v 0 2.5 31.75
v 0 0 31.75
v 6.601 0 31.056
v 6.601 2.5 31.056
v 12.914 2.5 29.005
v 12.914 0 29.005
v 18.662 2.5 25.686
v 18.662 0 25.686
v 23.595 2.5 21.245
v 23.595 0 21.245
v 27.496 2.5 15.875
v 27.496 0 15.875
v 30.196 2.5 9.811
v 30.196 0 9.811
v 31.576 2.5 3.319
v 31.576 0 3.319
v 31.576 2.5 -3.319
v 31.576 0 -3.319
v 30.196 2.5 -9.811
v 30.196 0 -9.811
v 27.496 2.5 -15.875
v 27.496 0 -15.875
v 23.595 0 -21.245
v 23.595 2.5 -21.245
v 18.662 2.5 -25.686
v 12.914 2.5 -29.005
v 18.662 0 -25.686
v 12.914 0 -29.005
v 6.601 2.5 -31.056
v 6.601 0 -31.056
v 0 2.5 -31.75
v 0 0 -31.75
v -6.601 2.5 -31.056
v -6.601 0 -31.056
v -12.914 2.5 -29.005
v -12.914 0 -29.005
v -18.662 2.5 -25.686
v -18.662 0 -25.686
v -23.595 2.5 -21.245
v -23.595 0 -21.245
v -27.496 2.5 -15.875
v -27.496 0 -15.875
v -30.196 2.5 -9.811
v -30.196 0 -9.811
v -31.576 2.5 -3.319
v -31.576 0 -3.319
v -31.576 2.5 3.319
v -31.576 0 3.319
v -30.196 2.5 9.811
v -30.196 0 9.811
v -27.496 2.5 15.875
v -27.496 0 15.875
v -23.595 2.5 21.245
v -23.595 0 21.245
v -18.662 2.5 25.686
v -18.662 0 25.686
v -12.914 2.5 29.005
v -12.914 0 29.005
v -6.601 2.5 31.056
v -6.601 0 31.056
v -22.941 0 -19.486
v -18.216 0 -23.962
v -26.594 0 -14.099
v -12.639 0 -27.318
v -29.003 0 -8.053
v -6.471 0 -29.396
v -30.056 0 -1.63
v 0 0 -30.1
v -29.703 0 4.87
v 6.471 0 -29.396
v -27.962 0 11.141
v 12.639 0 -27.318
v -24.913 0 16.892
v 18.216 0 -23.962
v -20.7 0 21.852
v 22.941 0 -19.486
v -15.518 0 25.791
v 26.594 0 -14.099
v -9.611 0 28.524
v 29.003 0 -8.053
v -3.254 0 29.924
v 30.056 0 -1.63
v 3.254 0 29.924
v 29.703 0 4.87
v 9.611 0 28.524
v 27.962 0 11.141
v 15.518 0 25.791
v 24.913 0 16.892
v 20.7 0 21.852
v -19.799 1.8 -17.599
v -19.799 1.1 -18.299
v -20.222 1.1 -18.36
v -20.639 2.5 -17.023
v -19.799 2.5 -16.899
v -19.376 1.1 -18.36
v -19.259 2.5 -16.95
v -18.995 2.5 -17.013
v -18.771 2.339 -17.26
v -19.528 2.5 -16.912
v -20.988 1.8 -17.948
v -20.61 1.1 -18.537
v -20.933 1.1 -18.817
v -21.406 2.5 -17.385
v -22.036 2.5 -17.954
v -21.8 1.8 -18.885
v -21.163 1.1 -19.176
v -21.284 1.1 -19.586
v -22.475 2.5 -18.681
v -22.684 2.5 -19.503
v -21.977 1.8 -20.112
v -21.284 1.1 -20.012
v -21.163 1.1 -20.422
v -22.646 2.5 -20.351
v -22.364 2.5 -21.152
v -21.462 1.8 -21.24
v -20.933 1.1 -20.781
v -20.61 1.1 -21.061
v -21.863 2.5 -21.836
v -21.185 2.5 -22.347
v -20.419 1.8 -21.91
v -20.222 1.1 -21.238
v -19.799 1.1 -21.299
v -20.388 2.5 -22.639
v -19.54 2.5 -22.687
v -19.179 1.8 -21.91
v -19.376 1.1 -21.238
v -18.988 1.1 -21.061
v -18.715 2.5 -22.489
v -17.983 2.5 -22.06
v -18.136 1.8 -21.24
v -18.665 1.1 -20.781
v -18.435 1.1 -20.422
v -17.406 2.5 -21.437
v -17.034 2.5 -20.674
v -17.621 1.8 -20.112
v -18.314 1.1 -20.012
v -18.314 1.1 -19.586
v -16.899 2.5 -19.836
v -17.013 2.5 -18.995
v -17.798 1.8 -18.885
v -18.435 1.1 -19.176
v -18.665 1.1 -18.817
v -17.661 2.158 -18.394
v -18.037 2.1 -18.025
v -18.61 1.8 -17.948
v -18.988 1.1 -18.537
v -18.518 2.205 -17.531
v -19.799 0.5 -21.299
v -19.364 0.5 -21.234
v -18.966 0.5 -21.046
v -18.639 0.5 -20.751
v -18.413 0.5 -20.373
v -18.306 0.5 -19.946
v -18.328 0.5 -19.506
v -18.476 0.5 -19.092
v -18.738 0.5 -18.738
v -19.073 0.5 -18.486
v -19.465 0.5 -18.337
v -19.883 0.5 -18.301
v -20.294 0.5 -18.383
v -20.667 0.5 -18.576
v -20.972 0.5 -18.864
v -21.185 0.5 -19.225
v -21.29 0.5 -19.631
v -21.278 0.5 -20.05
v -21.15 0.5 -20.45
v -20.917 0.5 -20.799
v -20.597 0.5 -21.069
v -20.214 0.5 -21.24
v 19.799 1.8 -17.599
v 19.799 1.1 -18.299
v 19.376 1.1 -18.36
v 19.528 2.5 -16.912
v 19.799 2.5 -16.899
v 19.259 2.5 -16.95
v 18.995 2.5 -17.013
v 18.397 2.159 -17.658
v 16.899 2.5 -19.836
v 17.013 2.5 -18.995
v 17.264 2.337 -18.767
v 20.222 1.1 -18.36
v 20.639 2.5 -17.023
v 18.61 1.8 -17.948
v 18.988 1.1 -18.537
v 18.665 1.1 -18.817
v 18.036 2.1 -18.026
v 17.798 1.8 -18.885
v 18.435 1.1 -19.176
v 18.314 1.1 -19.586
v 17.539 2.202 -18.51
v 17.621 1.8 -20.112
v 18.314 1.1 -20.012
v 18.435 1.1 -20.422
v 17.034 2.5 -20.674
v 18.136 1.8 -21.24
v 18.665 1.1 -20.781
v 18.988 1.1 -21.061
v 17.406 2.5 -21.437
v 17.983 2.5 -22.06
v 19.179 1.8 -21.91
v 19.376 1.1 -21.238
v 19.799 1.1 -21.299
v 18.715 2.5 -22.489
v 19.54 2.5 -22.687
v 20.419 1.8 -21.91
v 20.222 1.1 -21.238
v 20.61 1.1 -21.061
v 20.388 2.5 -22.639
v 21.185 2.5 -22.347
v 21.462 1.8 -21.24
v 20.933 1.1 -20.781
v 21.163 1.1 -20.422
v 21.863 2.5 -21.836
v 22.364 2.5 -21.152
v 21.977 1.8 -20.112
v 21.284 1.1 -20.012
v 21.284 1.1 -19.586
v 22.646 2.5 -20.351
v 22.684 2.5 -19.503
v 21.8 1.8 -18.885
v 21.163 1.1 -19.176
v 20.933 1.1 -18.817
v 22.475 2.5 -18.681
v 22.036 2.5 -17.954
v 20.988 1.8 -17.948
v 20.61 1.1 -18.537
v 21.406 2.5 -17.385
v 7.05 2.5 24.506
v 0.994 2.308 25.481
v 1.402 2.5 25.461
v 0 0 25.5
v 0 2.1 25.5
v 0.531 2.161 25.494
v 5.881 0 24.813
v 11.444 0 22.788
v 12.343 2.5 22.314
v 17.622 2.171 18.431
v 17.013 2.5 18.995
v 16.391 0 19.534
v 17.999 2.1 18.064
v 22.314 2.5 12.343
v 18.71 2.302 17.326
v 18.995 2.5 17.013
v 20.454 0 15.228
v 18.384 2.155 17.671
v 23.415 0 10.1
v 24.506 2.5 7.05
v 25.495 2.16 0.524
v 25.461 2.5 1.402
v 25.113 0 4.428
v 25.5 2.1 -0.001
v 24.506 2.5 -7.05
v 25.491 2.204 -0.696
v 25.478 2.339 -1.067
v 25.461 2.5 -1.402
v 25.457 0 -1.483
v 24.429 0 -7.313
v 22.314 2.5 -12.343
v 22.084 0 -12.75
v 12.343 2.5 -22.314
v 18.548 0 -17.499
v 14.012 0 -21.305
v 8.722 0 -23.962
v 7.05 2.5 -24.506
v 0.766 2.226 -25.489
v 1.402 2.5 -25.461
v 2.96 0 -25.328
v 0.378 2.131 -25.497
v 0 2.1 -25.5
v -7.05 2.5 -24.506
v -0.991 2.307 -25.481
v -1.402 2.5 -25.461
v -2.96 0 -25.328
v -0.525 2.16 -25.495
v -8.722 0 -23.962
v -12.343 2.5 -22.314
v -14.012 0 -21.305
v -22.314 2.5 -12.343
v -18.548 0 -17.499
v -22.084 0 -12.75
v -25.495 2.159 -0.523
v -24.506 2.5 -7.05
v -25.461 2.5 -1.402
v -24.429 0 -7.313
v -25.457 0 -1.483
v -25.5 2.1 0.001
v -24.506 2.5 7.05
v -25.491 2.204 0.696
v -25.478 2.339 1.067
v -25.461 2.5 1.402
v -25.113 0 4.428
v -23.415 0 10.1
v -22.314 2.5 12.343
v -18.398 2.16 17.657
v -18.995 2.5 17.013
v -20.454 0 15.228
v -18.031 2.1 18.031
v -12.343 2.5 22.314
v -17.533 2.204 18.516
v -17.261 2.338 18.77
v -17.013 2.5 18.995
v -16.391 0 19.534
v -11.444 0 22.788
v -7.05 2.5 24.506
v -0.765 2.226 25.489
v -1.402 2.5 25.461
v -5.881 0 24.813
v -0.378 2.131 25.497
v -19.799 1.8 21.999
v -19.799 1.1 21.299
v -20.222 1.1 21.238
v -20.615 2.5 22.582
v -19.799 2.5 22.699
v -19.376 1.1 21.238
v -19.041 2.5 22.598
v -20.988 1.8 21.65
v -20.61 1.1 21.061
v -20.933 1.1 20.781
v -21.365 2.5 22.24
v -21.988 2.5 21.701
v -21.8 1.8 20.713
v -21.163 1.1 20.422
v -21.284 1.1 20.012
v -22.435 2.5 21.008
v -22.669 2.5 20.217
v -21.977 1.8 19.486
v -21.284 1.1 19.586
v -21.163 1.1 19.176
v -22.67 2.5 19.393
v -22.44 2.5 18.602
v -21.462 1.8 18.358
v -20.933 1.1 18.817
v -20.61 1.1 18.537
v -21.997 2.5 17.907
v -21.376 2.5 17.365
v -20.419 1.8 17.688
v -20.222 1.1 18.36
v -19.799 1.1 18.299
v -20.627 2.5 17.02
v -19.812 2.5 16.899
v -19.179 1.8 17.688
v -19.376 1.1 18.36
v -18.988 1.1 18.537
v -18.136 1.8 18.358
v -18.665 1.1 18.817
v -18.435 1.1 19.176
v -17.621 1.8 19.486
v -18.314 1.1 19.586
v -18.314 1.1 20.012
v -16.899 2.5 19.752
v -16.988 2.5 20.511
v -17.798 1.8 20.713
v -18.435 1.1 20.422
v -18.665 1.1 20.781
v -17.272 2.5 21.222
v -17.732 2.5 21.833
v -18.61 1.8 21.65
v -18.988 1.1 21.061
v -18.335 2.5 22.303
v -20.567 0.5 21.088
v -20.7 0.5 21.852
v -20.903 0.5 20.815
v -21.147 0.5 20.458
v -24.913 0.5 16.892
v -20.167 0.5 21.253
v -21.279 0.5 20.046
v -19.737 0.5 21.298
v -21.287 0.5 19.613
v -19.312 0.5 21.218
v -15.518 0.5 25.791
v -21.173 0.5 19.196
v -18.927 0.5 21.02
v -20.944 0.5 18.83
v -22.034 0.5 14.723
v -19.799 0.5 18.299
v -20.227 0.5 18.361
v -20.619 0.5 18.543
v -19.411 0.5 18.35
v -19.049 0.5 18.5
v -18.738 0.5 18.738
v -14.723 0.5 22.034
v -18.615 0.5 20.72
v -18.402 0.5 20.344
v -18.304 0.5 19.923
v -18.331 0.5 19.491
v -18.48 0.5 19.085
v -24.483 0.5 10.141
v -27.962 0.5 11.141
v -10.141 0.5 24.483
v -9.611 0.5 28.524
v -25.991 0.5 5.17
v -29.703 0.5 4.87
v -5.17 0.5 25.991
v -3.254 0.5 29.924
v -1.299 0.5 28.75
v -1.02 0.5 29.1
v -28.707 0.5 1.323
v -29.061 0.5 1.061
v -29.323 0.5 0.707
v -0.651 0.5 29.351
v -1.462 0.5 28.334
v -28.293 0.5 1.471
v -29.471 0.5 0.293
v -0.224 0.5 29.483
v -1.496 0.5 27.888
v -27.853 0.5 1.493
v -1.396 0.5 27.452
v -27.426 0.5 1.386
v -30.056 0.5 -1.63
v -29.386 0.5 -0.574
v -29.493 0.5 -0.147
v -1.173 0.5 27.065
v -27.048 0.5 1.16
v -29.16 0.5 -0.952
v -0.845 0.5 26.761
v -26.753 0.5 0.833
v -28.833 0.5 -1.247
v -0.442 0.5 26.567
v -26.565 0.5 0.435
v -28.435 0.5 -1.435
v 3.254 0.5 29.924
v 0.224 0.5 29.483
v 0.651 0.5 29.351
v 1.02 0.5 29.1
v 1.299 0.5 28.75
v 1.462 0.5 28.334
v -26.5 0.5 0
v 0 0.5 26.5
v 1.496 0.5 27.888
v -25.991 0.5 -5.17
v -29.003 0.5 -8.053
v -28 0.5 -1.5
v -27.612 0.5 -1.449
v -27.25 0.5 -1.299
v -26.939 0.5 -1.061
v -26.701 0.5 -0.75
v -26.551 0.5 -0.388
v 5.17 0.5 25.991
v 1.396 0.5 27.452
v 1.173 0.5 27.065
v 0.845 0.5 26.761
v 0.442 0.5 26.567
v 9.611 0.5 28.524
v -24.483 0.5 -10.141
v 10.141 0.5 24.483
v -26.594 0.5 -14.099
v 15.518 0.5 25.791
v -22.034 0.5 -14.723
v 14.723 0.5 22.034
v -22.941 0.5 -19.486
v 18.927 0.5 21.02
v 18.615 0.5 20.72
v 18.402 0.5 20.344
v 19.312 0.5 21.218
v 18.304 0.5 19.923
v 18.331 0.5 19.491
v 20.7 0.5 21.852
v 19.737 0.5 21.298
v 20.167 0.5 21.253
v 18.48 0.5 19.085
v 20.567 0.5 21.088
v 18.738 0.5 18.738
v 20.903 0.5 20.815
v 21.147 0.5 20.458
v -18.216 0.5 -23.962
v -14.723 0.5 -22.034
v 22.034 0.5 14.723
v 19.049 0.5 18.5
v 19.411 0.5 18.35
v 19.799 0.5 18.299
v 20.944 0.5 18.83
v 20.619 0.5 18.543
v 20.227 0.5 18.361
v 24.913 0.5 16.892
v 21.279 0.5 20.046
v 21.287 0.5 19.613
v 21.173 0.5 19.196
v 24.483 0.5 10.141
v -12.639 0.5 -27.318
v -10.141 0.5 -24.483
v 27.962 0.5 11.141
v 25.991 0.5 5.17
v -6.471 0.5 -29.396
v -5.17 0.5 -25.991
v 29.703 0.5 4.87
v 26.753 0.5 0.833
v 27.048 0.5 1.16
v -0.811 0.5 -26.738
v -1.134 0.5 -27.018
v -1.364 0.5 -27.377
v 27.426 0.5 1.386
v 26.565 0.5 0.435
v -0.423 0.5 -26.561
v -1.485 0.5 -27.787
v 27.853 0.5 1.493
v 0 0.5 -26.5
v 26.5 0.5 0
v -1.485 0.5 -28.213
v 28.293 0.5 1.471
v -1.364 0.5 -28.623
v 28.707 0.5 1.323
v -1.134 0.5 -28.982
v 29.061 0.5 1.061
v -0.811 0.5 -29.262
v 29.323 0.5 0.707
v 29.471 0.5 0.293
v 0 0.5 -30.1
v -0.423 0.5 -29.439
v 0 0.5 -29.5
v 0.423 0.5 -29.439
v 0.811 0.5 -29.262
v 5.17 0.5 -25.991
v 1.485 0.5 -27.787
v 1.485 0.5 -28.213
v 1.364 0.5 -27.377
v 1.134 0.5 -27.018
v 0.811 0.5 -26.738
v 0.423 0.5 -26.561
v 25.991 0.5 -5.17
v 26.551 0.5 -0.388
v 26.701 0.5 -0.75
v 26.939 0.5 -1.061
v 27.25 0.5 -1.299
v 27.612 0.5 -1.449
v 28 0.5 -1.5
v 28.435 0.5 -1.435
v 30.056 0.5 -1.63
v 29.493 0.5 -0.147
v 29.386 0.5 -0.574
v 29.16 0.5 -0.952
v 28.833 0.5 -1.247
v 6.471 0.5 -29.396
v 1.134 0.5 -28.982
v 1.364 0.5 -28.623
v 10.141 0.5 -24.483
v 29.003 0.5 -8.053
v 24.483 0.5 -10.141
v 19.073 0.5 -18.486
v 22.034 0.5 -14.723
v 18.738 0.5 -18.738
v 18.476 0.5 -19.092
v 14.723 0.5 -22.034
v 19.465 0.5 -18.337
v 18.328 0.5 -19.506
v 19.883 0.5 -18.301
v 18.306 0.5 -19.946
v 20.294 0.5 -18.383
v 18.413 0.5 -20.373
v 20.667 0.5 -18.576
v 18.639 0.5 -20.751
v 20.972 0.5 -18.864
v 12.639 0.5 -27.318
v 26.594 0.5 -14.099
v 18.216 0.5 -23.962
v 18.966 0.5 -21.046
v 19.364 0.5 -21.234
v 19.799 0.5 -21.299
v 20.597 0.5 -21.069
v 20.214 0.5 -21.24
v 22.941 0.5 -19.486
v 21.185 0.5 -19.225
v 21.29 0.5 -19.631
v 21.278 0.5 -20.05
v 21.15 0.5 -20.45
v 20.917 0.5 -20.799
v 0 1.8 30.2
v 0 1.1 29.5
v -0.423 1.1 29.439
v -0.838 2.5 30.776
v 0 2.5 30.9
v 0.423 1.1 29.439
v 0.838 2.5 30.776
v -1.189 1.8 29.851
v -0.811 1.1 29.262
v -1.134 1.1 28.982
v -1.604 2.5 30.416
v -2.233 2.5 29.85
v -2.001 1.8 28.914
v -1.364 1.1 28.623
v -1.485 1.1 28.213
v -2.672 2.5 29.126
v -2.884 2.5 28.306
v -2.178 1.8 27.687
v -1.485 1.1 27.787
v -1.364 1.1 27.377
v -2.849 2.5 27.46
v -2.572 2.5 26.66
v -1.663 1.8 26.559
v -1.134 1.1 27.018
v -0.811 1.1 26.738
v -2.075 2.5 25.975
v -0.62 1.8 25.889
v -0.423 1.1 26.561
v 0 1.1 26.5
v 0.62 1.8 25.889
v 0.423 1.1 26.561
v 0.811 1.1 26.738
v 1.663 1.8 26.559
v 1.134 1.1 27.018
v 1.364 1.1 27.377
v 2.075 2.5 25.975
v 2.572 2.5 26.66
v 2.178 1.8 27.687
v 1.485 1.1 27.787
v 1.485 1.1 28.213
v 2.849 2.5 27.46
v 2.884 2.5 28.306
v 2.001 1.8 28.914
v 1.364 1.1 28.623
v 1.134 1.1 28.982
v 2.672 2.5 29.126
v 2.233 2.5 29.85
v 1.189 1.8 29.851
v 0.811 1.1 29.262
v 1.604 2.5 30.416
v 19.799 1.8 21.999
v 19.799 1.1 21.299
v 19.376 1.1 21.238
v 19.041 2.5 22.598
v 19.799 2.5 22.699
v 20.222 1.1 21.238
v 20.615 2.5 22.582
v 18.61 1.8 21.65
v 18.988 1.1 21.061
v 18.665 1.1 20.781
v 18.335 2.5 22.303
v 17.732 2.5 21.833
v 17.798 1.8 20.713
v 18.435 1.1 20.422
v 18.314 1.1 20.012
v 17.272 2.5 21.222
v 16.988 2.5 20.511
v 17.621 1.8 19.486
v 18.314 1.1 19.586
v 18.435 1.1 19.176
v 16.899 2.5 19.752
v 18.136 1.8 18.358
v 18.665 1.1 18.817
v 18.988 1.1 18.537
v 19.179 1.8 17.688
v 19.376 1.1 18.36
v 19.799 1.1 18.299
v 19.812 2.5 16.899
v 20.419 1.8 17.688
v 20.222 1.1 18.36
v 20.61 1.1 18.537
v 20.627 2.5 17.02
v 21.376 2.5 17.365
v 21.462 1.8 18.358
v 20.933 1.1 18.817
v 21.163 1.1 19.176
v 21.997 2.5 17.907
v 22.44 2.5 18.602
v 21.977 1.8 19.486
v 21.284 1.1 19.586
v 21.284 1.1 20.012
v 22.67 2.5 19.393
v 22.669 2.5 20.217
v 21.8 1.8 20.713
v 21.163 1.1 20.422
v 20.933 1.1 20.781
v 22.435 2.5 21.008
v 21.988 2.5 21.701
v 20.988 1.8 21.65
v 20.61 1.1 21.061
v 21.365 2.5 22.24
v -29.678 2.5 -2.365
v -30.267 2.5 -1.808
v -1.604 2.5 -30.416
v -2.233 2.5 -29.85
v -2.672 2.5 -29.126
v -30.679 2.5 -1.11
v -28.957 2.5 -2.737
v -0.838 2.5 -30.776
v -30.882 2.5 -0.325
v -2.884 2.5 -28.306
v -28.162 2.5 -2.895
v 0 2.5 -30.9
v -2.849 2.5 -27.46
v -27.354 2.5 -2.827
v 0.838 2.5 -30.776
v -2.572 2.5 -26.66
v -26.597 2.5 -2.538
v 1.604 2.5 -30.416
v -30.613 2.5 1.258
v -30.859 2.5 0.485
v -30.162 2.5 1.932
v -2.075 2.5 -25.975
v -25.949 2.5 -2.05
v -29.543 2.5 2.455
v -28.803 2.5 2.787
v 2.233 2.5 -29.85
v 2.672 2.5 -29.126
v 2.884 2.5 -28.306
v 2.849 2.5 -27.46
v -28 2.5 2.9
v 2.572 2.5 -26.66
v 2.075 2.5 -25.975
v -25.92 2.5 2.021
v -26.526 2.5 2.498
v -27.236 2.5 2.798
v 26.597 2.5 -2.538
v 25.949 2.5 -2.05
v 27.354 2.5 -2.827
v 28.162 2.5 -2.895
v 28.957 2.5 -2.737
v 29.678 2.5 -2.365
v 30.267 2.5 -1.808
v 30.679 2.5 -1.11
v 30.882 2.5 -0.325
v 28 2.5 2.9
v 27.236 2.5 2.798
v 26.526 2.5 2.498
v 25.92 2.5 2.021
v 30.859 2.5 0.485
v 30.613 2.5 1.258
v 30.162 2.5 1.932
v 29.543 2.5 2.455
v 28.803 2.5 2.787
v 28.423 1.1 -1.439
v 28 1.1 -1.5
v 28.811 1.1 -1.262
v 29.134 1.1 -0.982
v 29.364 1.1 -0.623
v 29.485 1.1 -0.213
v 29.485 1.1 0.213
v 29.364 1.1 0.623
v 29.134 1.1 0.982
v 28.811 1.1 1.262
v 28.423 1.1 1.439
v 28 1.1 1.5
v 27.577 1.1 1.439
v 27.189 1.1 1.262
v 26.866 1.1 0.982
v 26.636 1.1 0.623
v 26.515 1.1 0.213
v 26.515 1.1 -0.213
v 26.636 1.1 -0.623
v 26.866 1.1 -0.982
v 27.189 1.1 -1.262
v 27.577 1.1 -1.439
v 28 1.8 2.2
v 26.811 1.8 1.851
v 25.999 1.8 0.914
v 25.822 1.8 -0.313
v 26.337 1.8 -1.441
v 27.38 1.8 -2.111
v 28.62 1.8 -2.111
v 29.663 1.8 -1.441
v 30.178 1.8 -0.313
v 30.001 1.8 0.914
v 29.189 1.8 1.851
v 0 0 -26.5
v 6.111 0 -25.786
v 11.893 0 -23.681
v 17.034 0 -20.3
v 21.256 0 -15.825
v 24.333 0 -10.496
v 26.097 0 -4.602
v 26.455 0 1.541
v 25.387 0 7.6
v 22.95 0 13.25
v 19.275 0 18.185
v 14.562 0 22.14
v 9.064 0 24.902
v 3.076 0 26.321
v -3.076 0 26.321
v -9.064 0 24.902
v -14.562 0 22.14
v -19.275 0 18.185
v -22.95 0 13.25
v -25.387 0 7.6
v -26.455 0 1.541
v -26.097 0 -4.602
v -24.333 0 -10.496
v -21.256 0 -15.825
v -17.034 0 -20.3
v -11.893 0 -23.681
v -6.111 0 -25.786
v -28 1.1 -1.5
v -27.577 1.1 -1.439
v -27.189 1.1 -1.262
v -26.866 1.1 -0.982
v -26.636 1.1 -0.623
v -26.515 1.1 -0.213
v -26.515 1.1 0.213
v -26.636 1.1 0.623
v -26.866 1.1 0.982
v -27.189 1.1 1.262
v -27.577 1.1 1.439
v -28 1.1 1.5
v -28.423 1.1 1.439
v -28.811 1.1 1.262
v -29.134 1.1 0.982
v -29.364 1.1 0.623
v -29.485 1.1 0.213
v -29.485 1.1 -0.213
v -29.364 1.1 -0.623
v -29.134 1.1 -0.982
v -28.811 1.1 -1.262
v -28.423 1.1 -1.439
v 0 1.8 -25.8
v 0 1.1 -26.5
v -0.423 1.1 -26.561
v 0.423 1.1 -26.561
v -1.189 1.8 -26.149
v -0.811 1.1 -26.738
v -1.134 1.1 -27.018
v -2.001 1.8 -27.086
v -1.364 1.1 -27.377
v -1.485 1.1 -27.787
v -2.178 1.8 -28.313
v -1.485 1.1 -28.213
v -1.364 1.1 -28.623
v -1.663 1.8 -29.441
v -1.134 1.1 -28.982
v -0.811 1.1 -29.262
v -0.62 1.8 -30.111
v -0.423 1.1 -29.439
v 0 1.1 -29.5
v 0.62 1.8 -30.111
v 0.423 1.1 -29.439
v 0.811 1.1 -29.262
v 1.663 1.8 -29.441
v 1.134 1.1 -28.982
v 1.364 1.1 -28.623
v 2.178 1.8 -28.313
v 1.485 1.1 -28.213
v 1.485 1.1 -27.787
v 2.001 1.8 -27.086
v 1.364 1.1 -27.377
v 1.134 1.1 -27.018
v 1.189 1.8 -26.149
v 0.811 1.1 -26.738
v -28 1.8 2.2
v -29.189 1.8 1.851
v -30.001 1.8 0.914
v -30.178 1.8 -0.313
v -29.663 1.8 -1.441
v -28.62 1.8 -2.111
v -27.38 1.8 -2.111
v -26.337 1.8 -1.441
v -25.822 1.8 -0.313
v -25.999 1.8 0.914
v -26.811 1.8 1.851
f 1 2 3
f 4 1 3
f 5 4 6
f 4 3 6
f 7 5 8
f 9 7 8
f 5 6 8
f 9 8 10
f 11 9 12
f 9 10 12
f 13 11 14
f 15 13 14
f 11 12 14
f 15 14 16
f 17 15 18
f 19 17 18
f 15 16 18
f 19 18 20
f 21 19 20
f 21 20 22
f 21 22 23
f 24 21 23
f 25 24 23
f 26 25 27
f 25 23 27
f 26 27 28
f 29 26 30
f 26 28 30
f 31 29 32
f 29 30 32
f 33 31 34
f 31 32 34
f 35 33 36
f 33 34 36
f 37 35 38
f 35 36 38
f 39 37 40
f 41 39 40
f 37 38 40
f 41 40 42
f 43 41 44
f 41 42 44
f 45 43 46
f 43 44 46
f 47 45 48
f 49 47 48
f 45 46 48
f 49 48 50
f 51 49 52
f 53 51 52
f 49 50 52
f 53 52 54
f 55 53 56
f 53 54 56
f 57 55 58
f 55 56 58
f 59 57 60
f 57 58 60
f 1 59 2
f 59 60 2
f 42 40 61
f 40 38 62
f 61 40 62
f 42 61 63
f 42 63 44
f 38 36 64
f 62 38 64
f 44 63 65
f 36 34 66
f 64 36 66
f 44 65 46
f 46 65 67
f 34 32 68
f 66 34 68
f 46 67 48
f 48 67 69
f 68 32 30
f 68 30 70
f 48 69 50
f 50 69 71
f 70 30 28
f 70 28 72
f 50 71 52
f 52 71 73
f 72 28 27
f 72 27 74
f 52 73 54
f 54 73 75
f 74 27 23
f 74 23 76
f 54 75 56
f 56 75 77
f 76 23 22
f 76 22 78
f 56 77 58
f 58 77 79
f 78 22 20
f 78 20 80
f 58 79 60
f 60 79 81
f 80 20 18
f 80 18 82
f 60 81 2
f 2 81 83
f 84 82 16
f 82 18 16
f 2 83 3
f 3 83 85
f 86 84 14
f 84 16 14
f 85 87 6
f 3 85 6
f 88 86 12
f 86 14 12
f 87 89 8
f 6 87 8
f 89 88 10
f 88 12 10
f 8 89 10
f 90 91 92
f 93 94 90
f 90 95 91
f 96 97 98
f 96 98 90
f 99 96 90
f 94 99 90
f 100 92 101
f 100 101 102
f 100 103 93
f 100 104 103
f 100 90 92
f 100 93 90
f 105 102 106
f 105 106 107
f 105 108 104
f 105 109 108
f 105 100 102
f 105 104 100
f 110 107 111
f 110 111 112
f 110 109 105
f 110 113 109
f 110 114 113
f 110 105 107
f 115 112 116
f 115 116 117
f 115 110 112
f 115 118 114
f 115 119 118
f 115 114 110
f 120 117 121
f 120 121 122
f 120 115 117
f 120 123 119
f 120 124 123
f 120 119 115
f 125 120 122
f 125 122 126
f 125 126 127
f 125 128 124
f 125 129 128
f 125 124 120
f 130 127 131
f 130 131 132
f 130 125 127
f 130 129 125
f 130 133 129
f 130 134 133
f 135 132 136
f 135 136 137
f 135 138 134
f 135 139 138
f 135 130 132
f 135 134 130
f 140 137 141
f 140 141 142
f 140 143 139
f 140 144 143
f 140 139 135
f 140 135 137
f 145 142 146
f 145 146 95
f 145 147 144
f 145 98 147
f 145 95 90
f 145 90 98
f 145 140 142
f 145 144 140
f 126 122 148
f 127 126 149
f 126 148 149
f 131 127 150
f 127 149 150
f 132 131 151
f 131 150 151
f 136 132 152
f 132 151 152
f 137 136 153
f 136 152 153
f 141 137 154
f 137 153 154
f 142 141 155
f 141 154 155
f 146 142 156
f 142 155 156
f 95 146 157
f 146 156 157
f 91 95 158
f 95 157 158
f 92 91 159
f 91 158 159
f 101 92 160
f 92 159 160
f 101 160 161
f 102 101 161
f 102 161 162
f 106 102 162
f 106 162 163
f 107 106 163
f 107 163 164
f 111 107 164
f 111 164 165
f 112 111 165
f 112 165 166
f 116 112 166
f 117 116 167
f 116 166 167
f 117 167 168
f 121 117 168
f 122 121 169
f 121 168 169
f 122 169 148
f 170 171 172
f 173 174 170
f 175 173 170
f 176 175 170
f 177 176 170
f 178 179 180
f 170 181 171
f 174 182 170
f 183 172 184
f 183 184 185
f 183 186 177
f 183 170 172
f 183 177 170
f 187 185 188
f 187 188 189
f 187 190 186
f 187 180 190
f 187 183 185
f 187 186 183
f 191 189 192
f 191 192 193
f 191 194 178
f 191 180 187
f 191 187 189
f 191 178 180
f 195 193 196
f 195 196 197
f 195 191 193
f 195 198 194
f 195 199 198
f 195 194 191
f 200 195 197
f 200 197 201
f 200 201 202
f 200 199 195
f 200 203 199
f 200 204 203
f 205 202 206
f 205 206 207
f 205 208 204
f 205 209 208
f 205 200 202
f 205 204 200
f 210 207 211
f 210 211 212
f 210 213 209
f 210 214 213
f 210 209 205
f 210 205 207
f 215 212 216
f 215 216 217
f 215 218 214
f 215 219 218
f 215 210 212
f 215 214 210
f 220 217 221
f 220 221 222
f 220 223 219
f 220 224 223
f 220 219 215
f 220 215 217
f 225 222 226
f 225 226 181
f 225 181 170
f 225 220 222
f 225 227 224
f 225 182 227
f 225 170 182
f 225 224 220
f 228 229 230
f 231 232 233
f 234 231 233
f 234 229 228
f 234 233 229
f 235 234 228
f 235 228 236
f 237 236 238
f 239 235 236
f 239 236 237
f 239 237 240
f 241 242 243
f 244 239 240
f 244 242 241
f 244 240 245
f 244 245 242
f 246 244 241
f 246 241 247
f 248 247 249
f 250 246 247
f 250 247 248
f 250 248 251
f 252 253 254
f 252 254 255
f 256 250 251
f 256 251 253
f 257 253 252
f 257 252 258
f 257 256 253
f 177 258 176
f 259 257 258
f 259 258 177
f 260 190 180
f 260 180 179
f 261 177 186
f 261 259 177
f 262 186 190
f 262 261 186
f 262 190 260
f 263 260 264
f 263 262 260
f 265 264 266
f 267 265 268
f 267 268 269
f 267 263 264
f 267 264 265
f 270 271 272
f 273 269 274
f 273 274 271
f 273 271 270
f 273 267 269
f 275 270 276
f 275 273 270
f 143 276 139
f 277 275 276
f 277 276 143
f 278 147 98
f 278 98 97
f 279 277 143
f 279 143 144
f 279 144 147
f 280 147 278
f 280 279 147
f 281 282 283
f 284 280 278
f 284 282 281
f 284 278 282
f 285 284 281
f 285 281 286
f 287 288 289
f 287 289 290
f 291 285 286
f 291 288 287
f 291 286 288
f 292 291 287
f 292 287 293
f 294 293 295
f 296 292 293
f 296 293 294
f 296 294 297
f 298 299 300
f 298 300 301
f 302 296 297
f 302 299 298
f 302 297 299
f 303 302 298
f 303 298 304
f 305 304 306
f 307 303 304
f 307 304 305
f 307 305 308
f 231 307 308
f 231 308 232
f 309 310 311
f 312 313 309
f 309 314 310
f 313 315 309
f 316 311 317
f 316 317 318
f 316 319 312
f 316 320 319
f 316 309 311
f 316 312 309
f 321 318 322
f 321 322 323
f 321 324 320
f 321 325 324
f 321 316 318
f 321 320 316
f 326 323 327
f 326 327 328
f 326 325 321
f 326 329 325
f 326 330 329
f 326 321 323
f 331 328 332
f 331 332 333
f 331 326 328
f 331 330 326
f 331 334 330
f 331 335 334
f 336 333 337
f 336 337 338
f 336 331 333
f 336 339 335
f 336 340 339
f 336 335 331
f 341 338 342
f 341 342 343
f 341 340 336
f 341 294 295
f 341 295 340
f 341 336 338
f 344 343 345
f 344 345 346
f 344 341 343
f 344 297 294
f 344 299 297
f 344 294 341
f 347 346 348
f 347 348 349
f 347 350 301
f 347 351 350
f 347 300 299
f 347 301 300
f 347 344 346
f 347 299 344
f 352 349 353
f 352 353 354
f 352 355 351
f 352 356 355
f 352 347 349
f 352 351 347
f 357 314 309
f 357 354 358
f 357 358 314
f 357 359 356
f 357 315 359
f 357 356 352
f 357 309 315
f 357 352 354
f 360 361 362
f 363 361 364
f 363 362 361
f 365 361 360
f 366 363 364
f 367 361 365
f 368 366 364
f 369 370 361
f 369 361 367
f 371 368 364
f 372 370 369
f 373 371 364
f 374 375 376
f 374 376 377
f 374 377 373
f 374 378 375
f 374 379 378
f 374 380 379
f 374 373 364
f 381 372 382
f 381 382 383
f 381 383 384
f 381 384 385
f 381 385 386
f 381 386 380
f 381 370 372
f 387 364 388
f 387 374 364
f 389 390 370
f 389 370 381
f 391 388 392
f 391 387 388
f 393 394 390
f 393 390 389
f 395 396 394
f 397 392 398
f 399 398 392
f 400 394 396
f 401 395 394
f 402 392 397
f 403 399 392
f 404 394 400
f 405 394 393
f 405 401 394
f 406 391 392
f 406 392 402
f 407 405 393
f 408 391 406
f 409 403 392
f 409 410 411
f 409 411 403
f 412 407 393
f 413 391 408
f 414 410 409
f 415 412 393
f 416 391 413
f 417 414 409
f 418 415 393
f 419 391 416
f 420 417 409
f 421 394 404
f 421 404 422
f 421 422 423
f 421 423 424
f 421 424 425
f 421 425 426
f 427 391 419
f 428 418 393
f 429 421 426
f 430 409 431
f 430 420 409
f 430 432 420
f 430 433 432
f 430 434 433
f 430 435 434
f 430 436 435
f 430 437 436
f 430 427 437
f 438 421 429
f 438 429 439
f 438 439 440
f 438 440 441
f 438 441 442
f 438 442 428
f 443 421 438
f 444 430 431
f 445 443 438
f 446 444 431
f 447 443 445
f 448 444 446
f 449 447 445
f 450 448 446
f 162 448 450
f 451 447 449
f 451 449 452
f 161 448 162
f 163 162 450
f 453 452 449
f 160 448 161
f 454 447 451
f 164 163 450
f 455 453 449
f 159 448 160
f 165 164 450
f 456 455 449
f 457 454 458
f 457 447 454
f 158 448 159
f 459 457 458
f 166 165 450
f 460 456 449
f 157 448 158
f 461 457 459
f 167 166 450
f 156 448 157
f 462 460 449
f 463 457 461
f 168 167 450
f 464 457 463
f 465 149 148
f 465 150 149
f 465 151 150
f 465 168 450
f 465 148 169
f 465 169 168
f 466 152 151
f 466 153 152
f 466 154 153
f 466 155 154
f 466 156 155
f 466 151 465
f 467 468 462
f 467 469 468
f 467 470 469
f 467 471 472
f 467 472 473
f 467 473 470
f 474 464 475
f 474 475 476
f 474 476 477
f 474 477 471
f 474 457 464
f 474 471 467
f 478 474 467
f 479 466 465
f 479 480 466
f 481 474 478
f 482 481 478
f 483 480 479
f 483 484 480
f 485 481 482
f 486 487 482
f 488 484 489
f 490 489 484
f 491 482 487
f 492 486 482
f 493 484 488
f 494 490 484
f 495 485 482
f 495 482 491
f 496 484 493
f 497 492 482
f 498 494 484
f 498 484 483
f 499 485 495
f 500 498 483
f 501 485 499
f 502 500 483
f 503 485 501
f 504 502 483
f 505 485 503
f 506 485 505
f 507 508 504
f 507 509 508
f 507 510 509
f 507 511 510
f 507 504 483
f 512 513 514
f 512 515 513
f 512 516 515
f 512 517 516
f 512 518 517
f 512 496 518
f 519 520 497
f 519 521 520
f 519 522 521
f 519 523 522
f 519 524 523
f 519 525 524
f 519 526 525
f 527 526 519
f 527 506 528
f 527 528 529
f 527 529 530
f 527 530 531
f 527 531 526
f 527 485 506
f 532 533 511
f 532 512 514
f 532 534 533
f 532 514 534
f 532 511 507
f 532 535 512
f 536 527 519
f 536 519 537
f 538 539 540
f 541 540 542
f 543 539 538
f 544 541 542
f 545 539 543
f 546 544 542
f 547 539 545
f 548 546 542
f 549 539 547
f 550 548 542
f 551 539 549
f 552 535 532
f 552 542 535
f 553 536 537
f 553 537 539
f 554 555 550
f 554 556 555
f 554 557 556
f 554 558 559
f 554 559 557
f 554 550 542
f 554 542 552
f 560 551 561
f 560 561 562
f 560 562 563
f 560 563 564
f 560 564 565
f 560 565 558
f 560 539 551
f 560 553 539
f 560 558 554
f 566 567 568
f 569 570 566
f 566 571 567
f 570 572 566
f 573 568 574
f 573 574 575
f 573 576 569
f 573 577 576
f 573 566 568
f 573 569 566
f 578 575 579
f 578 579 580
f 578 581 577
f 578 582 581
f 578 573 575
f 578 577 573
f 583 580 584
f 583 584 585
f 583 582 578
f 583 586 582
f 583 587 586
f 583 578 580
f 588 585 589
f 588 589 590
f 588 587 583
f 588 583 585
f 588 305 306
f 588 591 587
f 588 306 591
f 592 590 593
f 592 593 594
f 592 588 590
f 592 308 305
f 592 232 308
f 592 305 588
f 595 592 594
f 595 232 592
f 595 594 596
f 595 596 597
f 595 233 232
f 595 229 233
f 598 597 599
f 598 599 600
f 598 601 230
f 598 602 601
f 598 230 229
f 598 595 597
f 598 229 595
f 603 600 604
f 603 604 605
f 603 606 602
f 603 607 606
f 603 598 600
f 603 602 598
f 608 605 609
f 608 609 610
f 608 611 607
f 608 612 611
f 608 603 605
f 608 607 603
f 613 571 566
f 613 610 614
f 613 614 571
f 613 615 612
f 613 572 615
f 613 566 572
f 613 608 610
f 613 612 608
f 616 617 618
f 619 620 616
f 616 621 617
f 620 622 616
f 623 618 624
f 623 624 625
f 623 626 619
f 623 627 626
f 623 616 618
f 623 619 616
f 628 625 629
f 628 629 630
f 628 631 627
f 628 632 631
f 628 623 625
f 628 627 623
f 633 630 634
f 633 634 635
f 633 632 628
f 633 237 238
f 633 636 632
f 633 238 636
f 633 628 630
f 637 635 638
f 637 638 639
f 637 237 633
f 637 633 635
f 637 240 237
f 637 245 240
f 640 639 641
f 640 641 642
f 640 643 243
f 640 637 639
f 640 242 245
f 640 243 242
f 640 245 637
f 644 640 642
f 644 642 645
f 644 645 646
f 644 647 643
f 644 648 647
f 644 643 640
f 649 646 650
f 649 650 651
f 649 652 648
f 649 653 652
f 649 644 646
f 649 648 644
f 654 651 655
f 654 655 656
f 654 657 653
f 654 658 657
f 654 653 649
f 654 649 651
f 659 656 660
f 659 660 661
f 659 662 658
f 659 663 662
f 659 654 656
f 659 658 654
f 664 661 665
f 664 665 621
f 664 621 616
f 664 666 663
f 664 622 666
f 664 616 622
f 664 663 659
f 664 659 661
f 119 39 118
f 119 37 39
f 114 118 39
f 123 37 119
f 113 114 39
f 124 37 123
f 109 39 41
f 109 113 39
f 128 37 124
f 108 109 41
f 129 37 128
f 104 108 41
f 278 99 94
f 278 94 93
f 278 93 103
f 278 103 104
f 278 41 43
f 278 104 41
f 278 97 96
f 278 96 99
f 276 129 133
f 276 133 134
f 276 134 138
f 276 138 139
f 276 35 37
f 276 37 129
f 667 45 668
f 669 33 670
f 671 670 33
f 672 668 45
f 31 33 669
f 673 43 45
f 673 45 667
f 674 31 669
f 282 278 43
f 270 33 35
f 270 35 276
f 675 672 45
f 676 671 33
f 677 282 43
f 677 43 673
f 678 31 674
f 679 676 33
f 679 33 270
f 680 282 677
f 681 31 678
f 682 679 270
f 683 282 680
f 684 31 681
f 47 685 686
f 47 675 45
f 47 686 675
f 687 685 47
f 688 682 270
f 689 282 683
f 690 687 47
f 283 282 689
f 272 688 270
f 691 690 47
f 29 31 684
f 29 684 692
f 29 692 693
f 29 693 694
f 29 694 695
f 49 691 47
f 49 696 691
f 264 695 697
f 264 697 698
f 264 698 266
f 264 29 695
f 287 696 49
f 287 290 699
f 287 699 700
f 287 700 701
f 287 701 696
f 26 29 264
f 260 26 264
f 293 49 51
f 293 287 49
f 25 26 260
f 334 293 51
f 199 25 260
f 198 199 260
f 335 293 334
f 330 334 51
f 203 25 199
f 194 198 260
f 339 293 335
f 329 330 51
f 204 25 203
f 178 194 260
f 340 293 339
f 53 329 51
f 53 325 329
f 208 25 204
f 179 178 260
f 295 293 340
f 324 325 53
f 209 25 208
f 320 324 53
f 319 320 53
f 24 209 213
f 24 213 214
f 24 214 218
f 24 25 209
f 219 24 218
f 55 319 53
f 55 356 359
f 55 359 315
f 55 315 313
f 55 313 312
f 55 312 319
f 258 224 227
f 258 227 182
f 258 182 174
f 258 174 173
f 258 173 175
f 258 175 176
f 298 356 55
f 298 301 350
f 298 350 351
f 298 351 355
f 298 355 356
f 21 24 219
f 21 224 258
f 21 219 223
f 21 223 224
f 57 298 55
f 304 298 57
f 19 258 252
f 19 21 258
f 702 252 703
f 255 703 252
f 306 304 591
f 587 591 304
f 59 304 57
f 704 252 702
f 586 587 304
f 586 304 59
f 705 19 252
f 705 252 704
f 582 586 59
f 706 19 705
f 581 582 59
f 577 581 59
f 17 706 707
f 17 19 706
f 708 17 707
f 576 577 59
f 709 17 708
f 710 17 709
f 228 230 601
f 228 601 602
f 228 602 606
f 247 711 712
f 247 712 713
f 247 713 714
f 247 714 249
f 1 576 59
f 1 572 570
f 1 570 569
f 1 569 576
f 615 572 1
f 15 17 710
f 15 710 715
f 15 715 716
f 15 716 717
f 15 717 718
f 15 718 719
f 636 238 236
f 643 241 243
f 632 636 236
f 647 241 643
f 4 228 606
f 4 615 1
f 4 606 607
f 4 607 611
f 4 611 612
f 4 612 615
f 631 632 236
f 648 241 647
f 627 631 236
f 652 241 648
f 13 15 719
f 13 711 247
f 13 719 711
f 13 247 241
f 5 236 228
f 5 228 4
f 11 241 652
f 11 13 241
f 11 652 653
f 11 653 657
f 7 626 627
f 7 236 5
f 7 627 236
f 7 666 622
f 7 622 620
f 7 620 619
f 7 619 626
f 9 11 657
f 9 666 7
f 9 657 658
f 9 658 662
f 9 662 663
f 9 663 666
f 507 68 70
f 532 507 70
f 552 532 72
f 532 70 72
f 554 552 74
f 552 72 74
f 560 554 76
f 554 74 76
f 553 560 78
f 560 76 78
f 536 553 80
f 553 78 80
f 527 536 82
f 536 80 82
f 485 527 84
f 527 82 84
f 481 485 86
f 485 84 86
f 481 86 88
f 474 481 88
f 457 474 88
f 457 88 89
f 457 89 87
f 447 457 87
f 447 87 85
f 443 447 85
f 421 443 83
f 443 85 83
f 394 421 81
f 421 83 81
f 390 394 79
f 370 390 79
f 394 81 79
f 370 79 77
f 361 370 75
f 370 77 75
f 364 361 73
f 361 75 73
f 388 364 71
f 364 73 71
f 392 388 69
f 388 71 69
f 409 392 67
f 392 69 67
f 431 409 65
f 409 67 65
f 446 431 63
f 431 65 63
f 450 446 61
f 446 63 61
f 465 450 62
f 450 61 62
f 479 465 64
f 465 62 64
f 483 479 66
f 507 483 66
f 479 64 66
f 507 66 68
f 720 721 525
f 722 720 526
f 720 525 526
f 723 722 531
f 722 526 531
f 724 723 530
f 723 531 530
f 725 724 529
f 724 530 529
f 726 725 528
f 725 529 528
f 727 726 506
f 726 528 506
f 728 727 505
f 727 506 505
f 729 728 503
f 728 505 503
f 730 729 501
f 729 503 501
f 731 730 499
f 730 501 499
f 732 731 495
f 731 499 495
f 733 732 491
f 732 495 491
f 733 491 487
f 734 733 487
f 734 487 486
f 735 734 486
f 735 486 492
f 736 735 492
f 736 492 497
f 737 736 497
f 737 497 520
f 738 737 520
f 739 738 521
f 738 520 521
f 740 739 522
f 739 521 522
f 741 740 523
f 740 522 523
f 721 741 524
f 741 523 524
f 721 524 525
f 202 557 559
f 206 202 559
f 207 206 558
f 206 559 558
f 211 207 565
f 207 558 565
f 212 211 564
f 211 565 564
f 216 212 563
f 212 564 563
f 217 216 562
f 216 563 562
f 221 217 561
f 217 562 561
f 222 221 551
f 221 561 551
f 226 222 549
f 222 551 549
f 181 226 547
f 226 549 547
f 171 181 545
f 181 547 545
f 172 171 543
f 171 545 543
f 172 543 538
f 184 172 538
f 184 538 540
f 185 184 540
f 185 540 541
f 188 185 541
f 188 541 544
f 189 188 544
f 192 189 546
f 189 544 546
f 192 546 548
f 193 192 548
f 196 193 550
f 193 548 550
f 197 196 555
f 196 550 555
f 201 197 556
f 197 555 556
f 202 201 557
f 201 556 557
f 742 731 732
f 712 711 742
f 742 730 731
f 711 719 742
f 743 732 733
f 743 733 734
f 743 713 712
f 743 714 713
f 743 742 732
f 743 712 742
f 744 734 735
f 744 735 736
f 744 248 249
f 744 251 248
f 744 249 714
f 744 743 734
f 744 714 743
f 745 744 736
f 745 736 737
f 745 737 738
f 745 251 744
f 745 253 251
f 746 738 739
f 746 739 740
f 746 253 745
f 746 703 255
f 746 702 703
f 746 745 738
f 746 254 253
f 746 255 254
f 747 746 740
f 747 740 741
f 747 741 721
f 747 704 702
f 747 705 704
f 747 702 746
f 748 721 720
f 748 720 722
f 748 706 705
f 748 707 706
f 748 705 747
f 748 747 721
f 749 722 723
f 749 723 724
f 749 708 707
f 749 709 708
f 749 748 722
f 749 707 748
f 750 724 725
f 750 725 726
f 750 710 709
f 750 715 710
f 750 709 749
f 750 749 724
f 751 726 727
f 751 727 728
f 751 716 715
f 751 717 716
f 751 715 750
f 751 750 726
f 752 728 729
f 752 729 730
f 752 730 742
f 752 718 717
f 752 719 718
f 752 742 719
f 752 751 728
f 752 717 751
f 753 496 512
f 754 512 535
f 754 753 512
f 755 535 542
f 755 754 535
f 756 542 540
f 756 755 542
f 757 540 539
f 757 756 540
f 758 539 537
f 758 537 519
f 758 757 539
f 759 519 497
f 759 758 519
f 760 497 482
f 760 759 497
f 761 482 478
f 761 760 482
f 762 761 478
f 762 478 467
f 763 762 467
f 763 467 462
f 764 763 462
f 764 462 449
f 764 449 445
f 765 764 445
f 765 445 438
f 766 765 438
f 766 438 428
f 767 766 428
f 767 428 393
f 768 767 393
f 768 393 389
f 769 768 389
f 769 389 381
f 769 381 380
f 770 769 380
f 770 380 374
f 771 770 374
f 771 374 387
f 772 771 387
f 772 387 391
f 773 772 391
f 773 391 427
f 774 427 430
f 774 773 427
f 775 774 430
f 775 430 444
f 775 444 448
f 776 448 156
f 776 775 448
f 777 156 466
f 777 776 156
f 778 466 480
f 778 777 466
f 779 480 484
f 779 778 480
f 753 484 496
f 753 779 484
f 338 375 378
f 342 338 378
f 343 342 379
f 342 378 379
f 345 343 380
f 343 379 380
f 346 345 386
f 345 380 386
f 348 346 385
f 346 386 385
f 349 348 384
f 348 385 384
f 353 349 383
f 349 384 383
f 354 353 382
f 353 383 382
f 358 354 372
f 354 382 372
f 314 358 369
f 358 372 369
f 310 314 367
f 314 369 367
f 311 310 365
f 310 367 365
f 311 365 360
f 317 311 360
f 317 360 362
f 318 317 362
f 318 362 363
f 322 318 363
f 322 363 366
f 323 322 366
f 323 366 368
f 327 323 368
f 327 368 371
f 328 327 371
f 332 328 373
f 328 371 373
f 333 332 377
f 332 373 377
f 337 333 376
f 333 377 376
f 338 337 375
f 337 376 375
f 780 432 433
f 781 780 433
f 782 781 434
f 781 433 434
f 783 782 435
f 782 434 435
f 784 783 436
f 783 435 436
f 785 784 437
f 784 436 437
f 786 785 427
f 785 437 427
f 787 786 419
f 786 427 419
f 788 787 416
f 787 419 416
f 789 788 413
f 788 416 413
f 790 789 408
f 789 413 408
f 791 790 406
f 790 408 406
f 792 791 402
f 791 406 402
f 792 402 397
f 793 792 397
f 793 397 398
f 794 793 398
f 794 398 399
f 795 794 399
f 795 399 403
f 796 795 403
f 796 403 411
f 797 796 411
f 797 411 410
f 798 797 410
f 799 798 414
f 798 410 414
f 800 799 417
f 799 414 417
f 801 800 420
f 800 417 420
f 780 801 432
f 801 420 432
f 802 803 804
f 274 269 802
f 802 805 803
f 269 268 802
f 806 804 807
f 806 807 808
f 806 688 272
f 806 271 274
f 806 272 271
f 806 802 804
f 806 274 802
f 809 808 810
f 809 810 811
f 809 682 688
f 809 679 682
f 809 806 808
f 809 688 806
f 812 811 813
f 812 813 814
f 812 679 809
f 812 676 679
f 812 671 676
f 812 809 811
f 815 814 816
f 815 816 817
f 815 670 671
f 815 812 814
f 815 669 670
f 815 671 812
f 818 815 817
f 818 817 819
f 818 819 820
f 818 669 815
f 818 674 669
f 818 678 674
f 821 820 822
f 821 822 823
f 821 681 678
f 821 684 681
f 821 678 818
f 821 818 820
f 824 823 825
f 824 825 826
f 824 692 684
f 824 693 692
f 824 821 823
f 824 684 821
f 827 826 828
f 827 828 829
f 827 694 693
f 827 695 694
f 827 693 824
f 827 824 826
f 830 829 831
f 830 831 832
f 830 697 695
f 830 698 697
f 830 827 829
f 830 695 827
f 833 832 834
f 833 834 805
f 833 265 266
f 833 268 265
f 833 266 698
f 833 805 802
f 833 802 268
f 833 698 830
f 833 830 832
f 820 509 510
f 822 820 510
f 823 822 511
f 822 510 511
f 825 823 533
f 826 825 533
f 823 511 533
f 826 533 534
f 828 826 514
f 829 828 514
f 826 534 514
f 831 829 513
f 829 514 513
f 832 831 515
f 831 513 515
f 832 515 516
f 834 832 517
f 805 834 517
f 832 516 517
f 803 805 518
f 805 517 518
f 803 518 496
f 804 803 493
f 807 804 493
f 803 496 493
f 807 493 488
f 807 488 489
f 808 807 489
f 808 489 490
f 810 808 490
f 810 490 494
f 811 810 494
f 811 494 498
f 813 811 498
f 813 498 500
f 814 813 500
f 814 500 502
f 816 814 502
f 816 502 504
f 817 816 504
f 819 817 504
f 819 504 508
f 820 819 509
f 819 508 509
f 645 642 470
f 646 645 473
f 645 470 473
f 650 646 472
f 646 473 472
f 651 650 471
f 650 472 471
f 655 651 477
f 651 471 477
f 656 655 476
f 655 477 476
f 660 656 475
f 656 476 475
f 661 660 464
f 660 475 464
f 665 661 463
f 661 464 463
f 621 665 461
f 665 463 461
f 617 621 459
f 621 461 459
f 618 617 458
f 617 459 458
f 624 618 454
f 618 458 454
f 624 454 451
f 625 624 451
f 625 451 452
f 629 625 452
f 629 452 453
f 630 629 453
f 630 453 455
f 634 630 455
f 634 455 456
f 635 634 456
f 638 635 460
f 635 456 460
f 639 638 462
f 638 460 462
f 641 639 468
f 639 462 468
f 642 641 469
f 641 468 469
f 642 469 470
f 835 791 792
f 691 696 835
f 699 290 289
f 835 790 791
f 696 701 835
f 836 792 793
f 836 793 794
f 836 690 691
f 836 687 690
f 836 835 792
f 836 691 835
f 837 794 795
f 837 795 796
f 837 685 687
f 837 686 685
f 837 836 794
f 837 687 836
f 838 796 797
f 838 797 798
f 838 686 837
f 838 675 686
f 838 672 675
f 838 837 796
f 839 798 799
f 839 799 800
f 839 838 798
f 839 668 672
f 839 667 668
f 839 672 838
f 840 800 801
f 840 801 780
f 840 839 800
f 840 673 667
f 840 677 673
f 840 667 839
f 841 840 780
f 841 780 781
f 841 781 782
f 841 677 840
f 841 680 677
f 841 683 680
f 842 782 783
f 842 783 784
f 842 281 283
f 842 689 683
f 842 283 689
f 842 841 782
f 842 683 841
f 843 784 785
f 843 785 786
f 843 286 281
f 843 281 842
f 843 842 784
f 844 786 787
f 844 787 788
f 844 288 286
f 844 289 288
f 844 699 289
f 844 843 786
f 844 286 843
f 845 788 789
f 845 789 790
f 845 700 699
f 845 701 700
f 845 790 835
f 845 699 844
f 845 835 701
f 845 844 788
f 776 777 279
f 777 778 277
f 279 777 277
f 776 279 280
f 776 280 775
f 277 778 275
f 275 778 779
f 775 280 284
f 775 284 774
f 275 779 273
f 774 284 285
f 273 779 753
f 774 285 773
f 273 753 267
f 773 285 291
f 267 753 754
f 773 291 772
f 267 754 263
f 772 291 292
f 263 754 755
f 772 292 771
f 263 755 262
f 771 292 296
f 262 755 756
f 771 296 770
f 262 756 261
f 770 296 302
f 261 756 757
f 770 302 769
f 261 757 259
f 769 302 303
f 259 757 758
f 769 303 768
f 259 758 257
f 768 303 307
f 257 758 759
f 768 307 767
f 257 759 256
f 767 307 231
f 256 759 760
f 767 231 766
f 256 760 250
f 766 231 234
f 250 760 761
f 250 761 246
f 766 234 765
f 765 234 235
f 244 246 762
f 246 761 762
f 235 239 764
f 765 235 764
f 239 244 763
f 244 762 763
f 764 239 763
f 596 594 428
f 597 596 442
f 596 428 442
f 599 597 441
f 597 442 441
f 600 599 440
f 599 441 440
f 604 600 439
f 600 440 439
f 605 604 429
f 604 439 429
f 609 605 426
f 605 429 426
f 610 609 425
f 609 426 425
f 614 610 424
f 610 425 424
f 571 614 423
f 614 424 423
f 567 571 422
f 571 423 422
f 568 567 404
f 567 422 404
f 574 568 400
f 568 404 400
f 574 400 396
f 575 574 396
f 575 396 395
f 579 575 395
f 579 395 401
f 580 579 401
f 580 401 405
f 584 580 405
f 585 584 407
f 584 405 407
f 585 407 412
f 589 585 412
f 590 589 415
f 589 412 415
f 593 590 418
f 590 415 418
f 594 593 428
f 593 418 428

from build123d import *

# Parameters (mm, degrees)
SKETCH_1_R               = 31.75
SKETCH_1_R_2             = 25.5
EXTRUDE_1_DEPTH          = 2.5
SKETCH_2_R               = 1.5
CUT_EXTRUDE_1_DEPTH      = 10
SKETCH_3_R               = 30.1
SKETCH_3_R_2             = 26.5
CUT_EXTRUDE_2_DEPTH      = 0.5
HOLE_WIZARD_1_AT_2_COUNT = 2
HOLE_WIZARD_1_AT_2_PITCH = 21.430272212
HOLE_WIZARD_1_AT_3_COUNT = 2
HOLE_WIZARD_1_AT_3_PITCH = 39.597979746
HOLE_WIZARD_1_AT_4_COUNT = 2
HOLE_WIZARD_1_AT_4_PITCH = 51.737253821
HOLE_WIZARD_1_AT_5_COUNT = 2
HOLE_WIZARD_1_AT_5_PITCH = 56
HOLE_WIZARD_1_AT_6_COUNT = 2
HOLE_WIZARD_1_AT_6_PITCH = 39.597979746
HOLE_WIZARD_1_AT_7_COUNT = 2
HOLE_WIZARD_1_AT_7_PITCH = 21.430272212
HOLE_WIZARD_1_AT_8_COUNT = 2
HOLE_WIZARD_1_AT_8_PITCH = 51.737253821


with BuildPart() as part:
    # 草图1 → 凸台-拉伸1 (new body)
    with BuildSketch(Plane(origin=(0, 0, 0), x_dir=(1, 0, 0), z_dir=(0, 1, 0))):
        with Locations(Location((0, 0, 0), (0, 0, 270))):
            Circle(SKETCH_1_R)
        with Locations(Location((0, 0, 0), (0, 0, 270))):
            Circle(SKETCH_1_R_2, mode=Mode.SUBTRACT)
    extrude(amount=EXTRUDE_1_DEPTH)

    # 草图2 → 切除-拉伸1 (cut)
    with BuildSketch(Plane.XZ):
        with Locations(Location((0, -28, 0), (0, 0, 270))):
            Circle(SKETCH_2_R)
        with Locations(Location((-19.798989873, -19.798989873, 0), (0, 0, 270))):
            Circle(SKETCH_2_R)
        with Locations(Location((-28, 0, 0), (0, 0, 270))):
            Circle(SKETCH_2_R)
        with Locations(Location((-19.798989873, 19.798989873, 0), (0, 0, 270))):
            Circle(SKETCH_2_R)
        with Locations(Location((0, 28, 0), (0, 0, 270))):
            Circle(SKETCH_2_R)
        with Locations(Location((19.798989873, 19.798989873, 0), (0, 0, 270))):
            Circle(SKETCH_2_R)
        with Locations(Location((28, 0, 0), (0, 0, 270))):
            Circle(SKETCH_2_R)
        with Locations(Location((19.798989873, -19.798989873, 0), (0, 0, 270))):
            Circle(SKETCH_2_R)
    extrude(amount=-CUT_EXTRUDE_1_DEPTH, mode=Mode.SUBTRACT)

    # 草图3 → 切除-拉伸2 (cut)
    with BuildSketch(Plane.XZ):
        with Locations(Location((0, 0, 0), (0, 0, 270))):
            Circle(SKETCH_3_R)
        with Locations(Location((0, 0, 0), (0, 0, 270))):
            Circle(SKETCH_3_R_2, mode=Mode.SUBTRACT)
    extrude(amount=-CUT_EXTRUDE_2_DEPTH, mode=Mode.SUBTRACT)

    # 草图4 → 打孔尺寸(%根据十字)槽沉头木螺钉的类型1 (revolve, cut)
    with BuildSketch(Plane(origin=(0, 2.5, -28), x_dir=(0, 0, 1), z_dir=(1, 0, 0))):
        Polygon((0, 0), (0, 2.5), (1.5, 2.5), (1.5, 1.4), (2.9, 0), align=None)
    hole_wizard_1 = revolve(axis=Axis((0, 8.85, -28), (0, -1, 0)), mode=Mode.SUBTRACT)

    # 打孔尺寸(%根据十字)槽沉头木螺钉的类型1 at 2: 打孔尺寸(%根据十字)槽沉头木螺钉的类型1 ×2
    with Locations(*[Vector(0.9238795325112867, 0, 0.3826834323650898) * (i * HOLE_WIZARD_1_AT_2_PITCH) for i in range(1, HOLE_WIZARD_1_AT_2_COUNT)]):
        add(hole_wizard_1, mode=Mode.SUBTRACT)

    # 打孔尺寸(%根据十字)槽沉头木螺钉的类型1 at 3: 打孔尺寸(%根据十字)槽沉头木螺钉的类型1 ×2
    with Locations(*[Vector(0.7071067811865476, 0, 0.7071067811865476) * (i * HOLE_WIZARD_1_AT_3_PITCH) for i in range(1, HOLE_WIZARD_1_AT_3_COUNT)]):
        add(hole_wizard_1, mode=Mode.SUBTRACT)

    # 打孔尺寸(%根据十字)槽沉头木螺钉的类型1 at 4: 打孔尺寸(%根据十字)槽沉头木螺钉的类型1 ×2
    with Locations(*[Vector(0.3826834323650897, 0, 0.9238795325112867) * (i * HOLE_WIZARD_1_AT_4_PITCH) for i in range(1, HOLE_WIZARD_1_AT_4_COUNT)]):
        add(hole_wizard_1, mode=Mode.SUBTRACT)

    # 打孔尺寸(%根据十字)槽沉头木螺钉的类型1 at 5: 打孔尺寸(%根据十字)槽沉头木螺钉的类型1 ×2
    with Locations(*[(0, 0, i * HOLE_WIZARD_1_AT_5_PITCH) for i in range(1, HOLE_WIZARD_1_AT_5_COUNT)]):
        add(hole_wizard_1, mode=Mode.SUBTRACT)

    # 打孔尺寸(%根据十字)槽沉头木螺钉的类型1 at 6: 打孔尺寸(%根据十字)槽沉头木螺钉的类型1 ×2
    with Locations(*[Vector(-0.7071067811865476, 0, 0.7071067811865476) * (i * HOLE_WIZARD_1_AT_6_PITCH) for i in range(1, HOLE_WIZARD_1_AT_6_COUNT)]):
        add(hole_wizard_1, mode=Mode.SUBTRACT)

    # 打孔尺寸(%根据十字)槽沉头木螺钉的类型1 at 7: 打孔尺寸(%根据十字)槽沉头木螺钉的类型1 ×2
    with Locations(*[Vector(-0.9238795325112868, 0, 0.3826834323650896) * (i * HOLE_WIZARD_1_AT_7_PITCH) for i in range(1, HOLE_WIZARD_1_AT_7_COUNT)]):
        add(hole_wizard_1, mode=Mode.SUBTRACT)

    # 打孔尺寸(%根据十字)槽沉头木螺钉的类型1 at 8: 打孔尺寸(%根据十字)槽沉头木螺钉的类型1 ×2
    with Locations(*[Vector(-0.3826834323650898, 0, 0.9238795325112867) * (i * HOLE_WIZARD_1_AT_8_PITCH) for i in range(1, HOLE_WIZARD_1_AT_8_COUNT)]):
        add(hole_wizard_1, mode=Mode.SUBTRACT)


solid = part.part
